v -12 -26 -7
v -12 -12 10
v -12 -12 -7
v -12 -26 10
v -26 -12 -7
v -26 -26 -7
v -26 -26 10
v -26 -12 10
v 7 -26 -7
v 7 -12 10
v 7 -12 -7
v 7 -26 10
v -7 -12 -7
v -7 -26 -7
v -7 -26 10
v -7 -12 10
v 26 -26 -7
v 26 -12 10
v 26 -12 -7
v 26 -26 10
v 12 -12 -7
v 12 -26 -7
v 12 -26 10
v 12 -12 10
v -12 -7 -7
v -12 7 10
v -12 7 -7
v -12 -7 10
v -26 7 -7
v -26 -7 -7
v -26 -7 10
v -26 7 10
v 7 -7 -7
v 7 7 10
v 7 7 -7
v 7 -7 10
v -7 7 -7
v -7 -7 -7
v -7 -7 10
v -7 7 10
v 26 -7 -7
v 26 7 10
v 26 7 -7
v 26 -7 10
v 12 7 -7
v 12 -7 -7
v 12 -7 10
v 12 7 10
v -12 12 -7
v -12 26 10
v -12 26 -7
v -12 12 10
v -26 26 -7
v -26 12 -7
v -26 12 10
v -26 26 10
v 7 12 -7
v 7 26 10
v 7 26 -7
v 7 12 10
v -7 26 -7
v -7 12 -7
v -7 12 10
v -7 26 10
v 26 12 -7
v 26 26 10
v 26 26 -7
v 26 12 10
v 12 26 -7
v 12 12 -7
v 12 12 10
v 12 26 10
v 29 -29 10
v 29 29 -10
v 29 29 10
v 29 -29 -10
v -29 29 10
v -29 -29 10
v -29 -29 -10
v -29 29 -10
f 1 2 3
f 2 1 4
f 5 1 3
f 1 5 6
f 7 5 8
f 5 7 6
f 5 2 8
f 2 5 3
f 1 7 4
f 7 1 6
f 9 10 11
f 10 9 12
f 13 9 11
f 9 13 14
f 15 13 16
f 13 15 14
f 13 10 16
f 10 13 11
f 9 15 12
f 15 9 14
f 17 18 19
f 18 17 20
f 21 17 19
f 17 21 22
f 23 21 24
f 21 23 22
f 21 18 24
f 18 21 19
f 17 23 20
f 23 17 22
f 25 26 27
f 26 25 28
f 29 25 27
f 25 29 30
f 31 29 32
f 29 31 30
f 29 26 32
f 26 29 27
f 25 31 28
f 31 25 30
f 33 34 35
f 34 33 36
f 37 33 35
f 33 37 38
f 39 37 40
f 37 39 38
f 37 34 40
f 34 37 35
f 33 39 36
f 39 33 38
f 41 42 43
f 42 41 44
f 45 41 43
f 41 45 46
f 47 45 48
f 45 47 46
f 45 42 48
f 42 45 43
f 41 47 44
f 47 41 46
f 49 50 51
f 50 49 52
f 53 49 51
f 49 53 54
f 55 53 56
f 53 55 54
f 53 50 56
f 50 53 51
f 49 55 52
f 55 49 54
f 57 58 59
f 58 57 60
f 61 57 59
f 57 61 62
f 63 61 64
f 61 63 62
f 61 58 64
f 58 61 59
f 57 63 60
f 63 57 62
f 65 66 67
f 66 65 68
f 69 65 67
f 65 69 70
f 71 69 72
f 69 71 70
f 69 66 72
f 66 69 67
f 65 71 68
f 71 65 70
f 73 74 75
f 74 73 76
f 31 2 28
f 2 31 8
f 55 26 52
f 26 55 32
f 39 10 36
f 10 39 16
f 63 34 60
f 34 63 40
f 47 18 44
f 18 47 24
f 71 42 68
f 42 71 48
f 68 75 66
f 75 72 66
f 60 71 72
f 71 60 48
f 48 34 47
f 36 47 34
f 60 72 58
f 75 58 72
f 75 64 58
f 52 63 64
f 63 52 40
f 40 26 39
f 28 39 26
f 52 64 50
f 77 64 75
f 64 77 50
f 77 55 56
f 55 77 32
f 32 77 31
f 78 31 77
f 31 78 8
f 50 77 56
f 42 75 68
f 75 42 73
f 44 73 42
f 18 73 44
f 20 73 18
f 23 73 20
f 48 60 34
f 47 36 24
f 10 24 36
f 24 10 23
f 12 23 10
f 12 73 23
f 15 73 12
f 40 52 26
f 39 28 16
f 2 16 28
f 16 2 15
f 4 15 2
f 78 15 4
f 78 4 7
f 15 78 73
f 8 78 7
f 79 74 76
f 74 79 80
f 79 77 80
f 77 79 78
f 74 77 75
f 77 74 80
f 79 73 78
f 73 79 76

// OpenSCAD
$fn = 32;

// ----------------------------------------------------------------------
// Pocket plate 58 x 58 x 20
// 3 x 3 pockets 14 mm square, 17 mm deep
// ----------------------------------------------------------------------

// --- parameters (mm) ---
thickness = 20;  // plate thickness
floor_t = 3;     // material left under each pocket
pocket = 14;     // pocket side length
pitch_x = 19;    // pocket pitch along X
pitch_y = 19;    // pocket pitch along Y
cols = 3;        // pockets per row
rows = 3;        // rows of pockets

// --- derived feature positions (mm) ---
depth = thickness - floor_t;        // = 17   pocket depth, down to the floor
span_x = (cols - 1) * pitch_x;      // = 38   distance between outer pockets
span_y = (rows - 1) * pitch_y;      // = 38   distance between outer pocket rows
origin_x = -span_x / 2;             // = -19   X of the first pocket
origin_y = -span_y / 2;             // = -19   Y of the first pocket
plate = [span_x + pocket + 6, span_y + pocket + 6, thickness];  // = [58, 58, 20]   overall size: pockets plus 3 mm of wall on each side
feature_centers = [
  [origin_x + 0 * pitch_x, origin_y + 0 * pitch_y],
  [origin_x + 1 * pitch_x, origin_y + 0 * pitch_y],
  [origin_x + 2 * pitch_x, origin_y + 0 * pitch_y],
  [origin_x + 0 * pitch_x, origin_y + 1 * pitch_y],
  [origin_x + 1 * pitch_x, origin_y + 1 * pitch_y],
  [origin_x + 2 * pitch_x, origin_y + 1 * pitch_y],
  [origin_x + 0 * pitch_x, origin_y + 2 * pitch_y],
  [origin_x + 1 * pitch_x, origin_y + 2 * pitch_y],
  [origin_x + 2 * pitch_x, origin_y + 2 * pitch_y]
];   // pocket centres, used verbatim by the cutter loop

// plate outline, then one pocket per centre in feature_centers
difference() {
  cube(plate, center = true);
  for (centre = feature_centers)
    translate([centre[0] - pocket / 2, centre[1] - pocket / 2, plate[2] / 2 - depth])
      cube([pocket, pocket, depth + 1]);  // centred on the declared pocket centre
}
